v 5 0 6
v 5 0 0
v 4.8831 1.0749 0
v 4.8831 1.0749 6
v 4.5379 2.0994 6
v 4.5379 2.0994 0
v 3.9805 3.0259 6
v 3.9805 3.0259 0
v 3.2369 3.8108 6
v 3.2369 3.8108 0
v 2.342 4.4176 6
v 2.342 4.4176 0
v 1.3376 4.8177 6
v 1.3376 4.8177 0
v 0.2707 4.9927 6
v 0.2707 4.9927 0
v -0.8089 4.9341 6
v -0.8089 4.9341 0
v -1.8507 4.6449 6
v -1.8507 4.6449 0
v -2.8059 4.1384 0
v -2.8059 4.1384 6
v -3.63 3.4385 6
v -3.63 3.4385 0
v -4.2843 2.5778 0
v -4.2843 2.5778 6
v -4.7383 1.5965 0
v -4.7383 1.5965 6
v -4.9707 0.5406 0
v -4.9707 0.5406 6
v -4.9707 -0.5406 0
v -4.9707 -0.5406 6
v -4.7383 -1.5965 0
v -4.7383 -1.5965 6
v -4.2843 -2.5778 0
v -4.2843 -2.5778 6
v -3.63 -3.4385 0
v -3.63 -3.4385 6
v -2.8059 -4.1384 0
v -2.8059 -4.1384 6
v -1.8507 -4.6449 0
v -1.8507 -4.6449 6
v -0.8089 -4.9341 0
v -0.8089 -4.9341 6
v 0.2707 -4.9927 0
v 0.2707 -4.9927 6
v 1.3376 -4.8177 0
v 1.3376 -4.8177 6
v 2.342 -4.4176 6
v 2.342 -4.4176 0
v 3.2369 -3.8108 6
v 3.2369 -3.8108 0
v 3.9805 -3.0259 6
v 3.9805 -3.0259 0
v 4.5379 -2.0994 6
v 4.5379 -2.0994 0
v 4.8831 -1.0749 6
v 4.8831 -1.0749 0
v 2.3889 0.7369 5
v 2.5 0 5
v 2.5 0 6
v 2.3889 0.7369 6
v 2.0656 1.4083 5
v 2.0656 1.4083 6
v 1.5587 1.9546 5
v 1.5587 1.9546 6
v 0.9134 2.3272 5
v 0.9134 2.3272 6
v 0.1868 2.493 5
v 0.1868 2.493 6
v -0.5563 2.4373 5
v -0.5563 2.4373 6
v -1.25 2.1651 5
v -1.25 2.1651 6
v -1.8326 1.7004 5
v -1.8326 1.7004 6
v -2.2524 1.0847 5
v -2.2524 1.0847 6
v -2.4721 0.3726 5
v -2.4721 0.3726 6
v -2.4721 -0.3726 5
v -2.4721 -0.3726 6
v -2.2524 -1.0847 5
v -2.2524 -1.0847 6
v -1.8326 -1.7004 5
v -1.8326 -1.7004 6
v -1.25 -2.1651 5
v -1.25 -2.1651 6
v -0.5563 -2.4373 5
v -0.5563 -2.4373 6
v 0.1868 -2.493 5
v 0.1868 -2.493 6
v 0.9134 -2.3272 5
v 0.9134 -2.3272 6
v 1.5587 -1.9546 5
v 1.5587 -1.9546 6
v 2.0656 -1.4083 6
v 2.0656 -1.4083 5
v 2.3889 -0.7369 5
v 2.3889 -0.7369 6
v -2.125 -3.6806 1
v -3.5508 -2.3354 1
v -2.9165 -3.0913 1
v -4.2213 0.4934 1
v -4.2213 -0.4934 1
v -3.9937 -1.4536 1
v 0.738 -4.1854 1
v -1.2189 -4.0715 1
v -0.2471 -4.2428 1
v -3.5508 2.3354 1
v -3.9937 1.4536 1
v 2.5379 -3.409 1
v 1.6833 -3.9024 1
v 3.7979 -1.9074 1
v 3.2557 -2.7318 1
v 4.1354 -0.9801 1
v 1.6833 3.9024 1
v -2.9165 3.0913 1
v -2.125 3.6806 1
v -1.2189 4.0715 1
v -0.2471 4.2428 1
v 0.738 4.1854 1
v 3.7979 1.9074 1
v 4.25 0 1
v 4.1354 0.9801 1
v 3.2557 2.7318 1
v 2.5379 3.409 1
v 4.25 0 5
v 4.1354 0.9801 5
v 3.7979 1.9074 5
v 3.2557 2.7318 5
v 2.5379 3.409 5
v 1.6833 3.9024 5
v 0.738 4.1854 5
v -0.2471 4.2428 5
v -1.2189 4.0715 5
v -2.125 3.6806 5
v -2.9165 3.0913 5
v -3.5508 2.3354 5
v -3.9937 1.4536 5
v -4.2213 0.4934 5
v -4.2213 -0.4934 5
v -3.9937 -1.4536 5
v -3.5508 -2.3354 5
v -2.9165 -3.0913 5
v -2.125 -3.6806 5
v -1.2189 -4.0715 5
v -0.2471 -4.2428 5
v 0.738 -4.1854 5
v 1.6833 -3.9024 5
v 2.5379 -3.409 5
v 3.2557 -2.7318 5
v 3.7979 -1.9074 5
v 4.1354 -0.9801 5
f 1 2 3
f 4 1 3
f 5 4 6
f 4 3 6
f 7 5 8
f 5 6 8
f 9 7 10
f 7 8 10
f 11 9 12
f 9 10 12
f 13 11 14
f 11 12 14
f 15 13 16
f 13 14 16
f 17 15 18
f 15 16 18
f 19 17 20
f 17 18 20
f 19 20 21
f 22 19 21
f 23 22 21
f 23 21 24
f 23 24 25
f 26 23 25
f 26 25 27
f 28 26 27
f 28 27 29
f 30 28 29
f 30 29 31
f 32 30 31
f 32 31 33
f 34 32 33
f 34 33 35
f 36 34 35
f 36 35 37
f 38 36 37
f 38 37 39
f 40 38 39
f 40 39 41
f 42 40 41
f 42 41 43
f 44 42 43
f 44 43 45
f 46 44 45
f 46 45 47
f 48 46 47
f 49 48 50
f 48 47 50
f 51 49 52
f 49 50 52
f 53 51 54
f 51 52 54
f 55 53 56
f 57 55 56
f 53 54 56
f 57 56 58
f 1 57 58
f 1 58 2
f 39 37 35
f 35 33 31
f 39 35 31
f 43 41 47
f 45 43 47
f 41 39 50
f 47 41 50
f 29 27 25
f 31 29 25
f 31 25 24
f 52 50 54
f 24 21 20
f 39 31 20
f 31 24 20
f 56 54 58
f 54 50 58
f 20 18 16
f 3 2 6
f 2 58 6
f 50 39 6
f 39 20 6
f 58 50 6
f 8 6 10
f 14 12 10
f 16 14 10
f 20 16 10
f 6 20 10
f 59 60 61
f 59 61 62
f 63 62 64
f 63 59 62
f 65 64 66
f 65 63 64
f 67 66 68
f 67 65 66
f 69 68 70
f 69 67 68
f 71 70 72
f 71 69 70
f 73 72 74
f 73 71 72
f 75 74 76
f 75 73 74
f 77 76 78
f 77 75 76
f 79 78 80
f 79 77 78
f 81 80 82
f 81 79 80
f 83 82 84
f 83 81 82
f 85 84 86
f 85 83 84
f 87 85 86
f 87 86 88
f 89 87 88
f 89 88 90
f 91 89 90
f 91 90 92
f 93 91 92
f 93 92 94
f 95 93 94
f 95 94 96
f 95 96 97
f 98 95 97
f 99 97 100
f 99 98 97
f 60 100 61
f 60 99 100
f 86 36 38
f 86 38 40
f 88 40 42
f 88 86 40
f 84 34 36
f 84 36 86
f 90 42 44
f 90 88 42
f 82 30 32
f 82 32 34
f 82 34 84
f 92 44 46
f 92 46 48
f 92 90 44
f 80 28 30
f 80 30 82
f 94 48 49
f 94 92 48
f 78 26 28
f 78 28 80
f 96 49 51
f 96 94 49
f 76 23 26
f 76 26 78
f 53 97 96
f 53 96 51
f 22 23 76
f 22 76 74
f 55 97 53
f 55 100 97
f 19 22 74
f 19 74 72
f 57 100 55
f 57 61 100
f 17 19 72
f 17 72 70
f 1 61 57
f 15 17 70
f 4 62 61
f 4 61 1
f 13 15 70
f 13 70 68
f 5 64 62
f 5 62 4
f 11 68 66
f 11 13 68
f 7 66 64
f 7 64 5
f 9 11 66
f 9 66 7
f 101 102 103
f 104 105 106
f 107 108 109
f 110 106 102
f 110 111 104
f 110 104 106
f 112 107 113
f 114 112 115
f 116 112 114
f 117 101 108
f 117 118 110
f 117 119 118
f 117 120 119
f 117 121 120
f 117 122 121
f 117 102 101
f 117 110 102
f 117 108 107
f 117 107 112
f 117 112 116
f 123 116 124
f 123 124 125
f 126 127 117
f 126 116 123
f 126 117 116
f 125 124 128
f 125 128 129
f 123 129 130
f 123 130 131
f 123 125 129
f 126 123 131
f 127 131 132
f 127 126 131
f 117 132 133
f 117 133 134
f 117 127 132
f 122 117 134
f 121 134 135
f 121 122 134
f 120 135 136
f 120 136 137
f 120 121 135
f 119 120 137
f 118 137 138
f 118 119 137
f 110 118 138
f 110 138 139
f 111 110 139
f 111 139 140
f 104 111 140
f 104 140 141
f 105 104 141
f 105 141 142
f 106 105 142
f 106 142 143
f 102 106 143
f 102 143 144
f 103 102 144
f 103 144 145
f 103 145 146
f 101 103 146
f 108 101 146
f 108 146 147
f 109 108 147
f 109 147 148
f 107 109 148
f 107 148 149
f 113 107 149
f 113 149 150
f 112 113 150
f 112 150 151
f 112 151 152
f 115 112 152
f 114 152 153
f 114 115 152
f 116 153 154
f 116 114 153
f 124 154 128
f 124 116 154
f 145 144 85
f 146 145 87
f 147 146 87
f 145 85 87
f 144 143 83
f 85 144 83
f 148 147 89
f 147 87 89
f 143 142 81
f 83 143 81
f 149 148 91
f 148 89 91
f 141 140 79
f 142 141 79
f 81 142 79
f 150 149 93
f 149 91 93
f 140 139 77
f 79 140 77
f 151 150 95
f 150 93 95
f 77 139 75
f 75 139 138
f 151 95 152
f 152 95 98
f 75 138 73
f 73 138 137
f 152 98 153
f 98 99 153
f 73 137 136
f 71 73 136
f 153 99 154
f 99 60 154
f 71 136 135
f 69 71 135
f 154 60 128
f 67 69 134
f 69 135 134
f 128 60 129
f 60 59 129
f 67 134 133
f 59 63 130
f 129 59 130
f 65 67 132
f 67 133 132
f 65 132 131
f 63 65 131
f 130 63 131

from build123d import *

# Parameters (mm, degrees)
F0_R     = 5
F0_R_2   = 4.25
F0_R_3   = 2.5
F1_DEPTH = 1
F2_DEPTH = 6
F3_START = 5
F3_DEPTH = 1


with BuildPart() as f1:
    # F0 (on Top) → F1 (new body)
    with BuildSketch(Plane.XY):
        Circle(F0_R)
        Circle(F0_R_2, mode=Mode.SUBTRACT)
        Circle(F0_R_2)
        Circle(F0_R_3, mode=Mode.SUBTRACT)
        Circle(F0_R_3)
    extrude(amount=F1_DEPTH)

    # F0 (on Top) → F2 (join)
    with BuildSketch(Plane.XY):
        Circle(F0_R)
        Circle(F0_R_2, mode=Mode.SUBTRACT)
    extrude(amount=F2_DEPTH)

    # F0 (on Top) → F3 (join)
    with BuildSketch(Plane.XY.offset(F3_START)):
        Circle(F0_R_2)
        Circle(F0_R_3, mode=Mode.SUBTRACT)
    extrude(amount=F3_DEPTH)


solid = f1.part
